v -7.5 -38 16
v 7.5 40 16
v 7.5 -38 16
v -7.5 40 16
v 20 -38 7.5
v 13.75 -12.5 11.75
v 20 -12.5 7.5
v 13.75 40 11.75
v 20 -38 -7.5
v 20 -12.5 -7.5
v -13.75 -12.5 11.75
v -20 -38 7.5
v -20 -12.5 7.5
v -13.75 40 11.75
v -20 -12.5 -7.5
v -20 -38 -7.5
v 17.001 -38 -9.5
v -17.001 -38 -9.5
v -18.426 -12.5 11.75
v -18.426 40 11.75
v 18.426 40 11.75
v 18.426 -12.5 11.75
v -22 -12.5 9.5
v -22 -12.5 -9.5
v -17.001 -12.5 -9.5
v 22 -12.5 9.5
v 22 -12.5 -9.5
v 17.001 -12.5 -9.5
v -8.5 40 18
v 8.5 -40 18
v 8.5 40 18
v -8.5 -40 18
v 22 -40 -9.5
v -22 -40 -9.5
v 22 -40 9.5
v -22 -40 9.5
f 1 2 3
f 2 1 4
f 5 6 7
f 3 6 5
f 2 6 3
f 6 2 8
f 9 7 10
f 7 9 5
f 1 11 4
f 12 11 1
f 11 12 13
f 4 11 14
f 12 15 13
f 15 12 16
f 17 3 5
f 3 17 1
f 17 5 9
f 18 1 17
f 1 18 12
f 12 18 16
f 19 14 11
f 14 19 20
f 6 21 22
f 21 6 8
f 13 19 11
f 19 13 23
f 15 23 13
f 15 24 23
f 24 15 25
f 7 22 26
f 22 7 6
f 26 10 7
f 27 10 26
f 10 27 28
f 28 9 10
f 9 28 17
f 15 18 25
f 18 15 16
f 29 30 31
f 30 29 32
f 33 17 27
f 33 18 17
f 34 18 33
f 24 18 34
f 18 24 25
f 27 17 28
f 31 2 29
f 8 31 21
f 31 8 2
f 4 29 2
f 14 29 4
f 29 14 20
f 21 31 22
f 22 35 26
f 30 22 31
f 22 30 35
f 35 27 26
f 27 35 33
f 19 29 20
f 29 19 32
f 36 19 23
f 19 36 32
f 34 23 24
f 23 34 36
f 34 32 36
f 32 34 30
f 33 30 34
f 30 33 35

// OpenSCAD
//use <./sc.scad>
t=2;
w1=40;
w2=15;
h1=15;
h2=16;
d1=20;
d2=80;
D(){hull(){
    Cu(w1+2*t,d2,h1+2*t);Tz(h2-h1/2)Cu(w2+t,d2,h1+2*t);}
    Ty(t)hull(){Cu(w1,d2,h1);Tz(h2-h1/2)Cu(w2,d2,h1);}
    Ty(d1)Cu(w1+3*t,d2-h1,h2+h1/2);
    T(0,t,-h1/2-t)hull(){Cu(w1-3*t,d2,0.001);Tz(t)Cu(w1,d2,0.001);}
    }
    
    // ShortCuts.scad 
// Autor: Rudolf Huttary, Berlin 2015
//
$fn = 100; 


//show_examples(); 

module show_examples()
	place_in_rect(30, 30)
	{
		Cy(h = 10); 
		CyH(h = 10); 
		CyH(h = 10, w = 30); 
		CyS(h = 10); 
		CyS(h = 10, w1 = 25, w2 = 75); 
		Cu(10); 
		Ri(h = 10); 
		RiH(h = 10); 
		RiS(h = 10, w1 = 10); 
		RiS(h = 10, w1 = 30, w2 = 300); 
		Sp(); 
		SpH(10, 30, 30); 
	}



module help()
{
echo("==============="); 
echo("help(): shows this help"); 
echo("show_examples(): shows some examples"); 
echo("place_in_rect(): places children objects in grid"); 
echo("Transformations:"); 
echo(" transform :  T(x=0, y=0, z=0), Tx(x=0) , Ty(y=0), Tz(z=0)"); 
echo(" rotate :  R(x=0, y=0, z=0), Rx(x=0) , Ry(y=0), Rz(z=0)"); 
echo(" scale :  S(x=1, y=1, z=1), Sx(x=1) , Sy(y=1), Sz(z=1)"); 
echo("Logical"); 
echo(" difference :  D()"); 
echo(" union :  U()"); 
echo(" intersection : *missing*"); 
echo("Primitives"); 
echo(" circle :  Ci(r=10)"); 
echo(" circle_half :  CiH(r=10, w=0)")
echo(" circle_segment :  CiS(r=10, w1=0, w2=90)")
echo(" square :  Sq(x=10, y=0, center=true))"); 
echo(" cylinder :  Cy(r=10, h=1, center=true)"); 
echo(" cylinder_half :  CyH(r=10, w=0)")
echo(" cylinder_segment: CyS(r=10, h=1, w1=0, w2=90,center=true)"); 
echo(" cylinder_segment: Pie(r=10, h=1, w1=0, w2=90,center=true)"); 
echo(" cube :  Cu(x=10, y=0, z=10, center=true)"); 
echo(" ring :  Ri(R=10, r=5, h=1, center=true)"); 
echo(" ring_half :  RiH(R=10, r=5, h=1, w=0 center=true)"); 
echo(" ring_segment :  RiS(R=10, r=5, h=1, w1=0, w2=90, center=true)"); 
echo(" sphere:  Sp(r=10))"); 
echo(" sphere_half:  SpH(r=10, w1 = 0, w2 = 0))"); 
echo("==============="); 
}


// Euclidean Transformations

module T(x=0, y=0, z=0){translate([x, y, z])children(); }
module Tx(x) { translate([x, 0, 0])children(); }
module Ty(y) { translate([0, y, 0])children(); }
module Tz(z) { translate([0, 0, z])children(); }


module R(x=0, y=0, z=0){rotate([x, y, z]) children();}
module Rx(x=90){rotate([x, 0, 0]) children();}
module Ry(y=90){rotate([0, y, 0]) children();}
module Rz(z=90){rotate([0, 0, z]) children();}

module S(x=1, y=1, z=1){scale([x, y, z]) children();}
module Sx(x=1){scale([x, 1, 1]) children();}
module Sy(y=1){scale([1, y, 1]) children();}
module Sz(z=1){scale([1, 1, z]) children();}


module D() difference(){children(0); children([1:$children-1]);}
module U() children([0:$children-1]);
// module I() intersection()children([0:$children-1]); // does not work for some reason


// primitives - 2D

module Sq(x =10, y = 0, center = true)
{
   if(y==0)
		square([x, x], center = center); 
	else
		square([x, y], center = center); 
}
module Ci(r = 10)
{
	circle(r = r); 
}

// derived primitives - 2d
module CiH(r = 10, w = 0)
  circle_half(r, w); 

module CiS(r = 10, w1 = 0, w2 = 90)
  circle_segment(r, w1, w2); 


// primitives - 3d
module Cy(r = 10, h = 1, center = true)
{
	cylinder(r = r, h = h, center = center); 
}
module Cu(x = 10, y = 0, z = 10, center = true)
{
  if (y==0)
	cube([x, x, x], center = center); 
  else
	cube([x, y, z], center = center); 
}

// derived primitives - 3d
module CyH(r = 10, h = 1, w = 0, center = true)
  cylinder_half(r, h, w, center); 

module CyS(r = 10, h = 1, w1 = 0, w2 = 90, center = true)
  cylinder_segment(r, h, w1, w2, center); 

module Ri(R = 10, r = 5, h = 1, center = true)
  ring(R, r, h, center); 

module RiS(R = 10, r = 5, h = 1, w1 = 0, w2 = 90, center = true)
   ring_segment(R, r, h, w1, w2, center); 

module RiH(r1 = 10, r2, h = 1, w = 0, center = true)
   ring_half(r1, r2, h, w, center); 
module Pie(r = 10, h = 1, w1 = 0, w2 = 90, center = true)
  cylinder_segment(r, h, w1, w2, center);  
module Sp(r = 10)
  sphere(r); 
module SpH(r = 10, w1 = 0, w2 = 0)
  sphere_half(r, w1, w2); 
module SpS(r = 10, w1 = 0, w2 = 90, w3 = 90)
  sphere_segment(r, w1, w2); 




// clear text definitions
module circle_half(r = 10, w = 0)
{
	difference()
	{
		circle(r); 
     rotate([0, 0, w-90])
     translate([0, -r])
		square([r, 2*r], center = false); 
	}
}

module circle_segment(r = 10, w1 = 0, w2 = 90)
{
  W2 = (w1>w2)?w2+360:w2; 
  if (W2-w1 < 180)
    intersection()
		{
       circle_half(r, w1); 
       circle_half(r, W2-180); 
 		}
	else
    union()
		{
       circle_half(r, w1); 
       circle_half(r, W2-180); 
 		}
}

module cylinder_half(r = 10, h = 1, w = 0, center = true)
{
  linear_extrude(height = h, center = center)
  circle_half(r, w); 
} 

module cylinder_segment(r = 10, h = 1, w1 = 0, w2 = 90, center = true)
{
  linear_extrude(height = h, center = center)
  circle_segment(r, w1, w2); 
} 

module ring(R = 10, r = 5, h = 1, center = true)
{
	difference()
	{
	cylinder(r = R, h = h, center = center); 
   translate([0, 0, -2*h])
	cylinder(r = r, h = 4*h, center = false); 
	}
}

module ring_half(R = 10, r = 5, h = 1, w = 0, center = true)
{
	difference()
	{
		ring(R, r, h, center); 
     rotate([0, 0, w])
     translate([0, -R/2, 0])
		cube([2*R, R, 3*h], center = true); 
	}
}

module ring_segment(R = 10, r = 5, h = 1, w1 = 0, w2 = 90, center = true)
{
  W2 = (w1>w2)?w2+360:w2; 
  if (W2-w1 < 180)
    intersection()
		{
       ring_half(R, r, h, w1, center); 
       ring_half(R, r, h, W2-180, center); 
 		}
	else
    union()
		{
       ring_half(R, r, h, w1, center); 
       ring_half(R, r, h, W2-180, center); 
 		}
}


module sphere_half(r = 10, w1 = 0, w2 = 0)
{  
	difference()
	{
   	sphere(r); 
      rotate([-w1, -w2, 0])
     	translate([0, 0, r])
		cube(2*r, 2*r, r, center = true); 
	}

}


// additional code
module place_in_rect(dx =20, dy=20)
{
  cols = ceil(sqrt($children)); 
  rows = floor(sqrt($children)); 
  for(i = [0:$children-1])
	{ 
	  T(dx*(-cols/2+(i%cols)+.5), dy*(rows/2-floor(i/cols)-.5))
		 children(i); 
	}
}
